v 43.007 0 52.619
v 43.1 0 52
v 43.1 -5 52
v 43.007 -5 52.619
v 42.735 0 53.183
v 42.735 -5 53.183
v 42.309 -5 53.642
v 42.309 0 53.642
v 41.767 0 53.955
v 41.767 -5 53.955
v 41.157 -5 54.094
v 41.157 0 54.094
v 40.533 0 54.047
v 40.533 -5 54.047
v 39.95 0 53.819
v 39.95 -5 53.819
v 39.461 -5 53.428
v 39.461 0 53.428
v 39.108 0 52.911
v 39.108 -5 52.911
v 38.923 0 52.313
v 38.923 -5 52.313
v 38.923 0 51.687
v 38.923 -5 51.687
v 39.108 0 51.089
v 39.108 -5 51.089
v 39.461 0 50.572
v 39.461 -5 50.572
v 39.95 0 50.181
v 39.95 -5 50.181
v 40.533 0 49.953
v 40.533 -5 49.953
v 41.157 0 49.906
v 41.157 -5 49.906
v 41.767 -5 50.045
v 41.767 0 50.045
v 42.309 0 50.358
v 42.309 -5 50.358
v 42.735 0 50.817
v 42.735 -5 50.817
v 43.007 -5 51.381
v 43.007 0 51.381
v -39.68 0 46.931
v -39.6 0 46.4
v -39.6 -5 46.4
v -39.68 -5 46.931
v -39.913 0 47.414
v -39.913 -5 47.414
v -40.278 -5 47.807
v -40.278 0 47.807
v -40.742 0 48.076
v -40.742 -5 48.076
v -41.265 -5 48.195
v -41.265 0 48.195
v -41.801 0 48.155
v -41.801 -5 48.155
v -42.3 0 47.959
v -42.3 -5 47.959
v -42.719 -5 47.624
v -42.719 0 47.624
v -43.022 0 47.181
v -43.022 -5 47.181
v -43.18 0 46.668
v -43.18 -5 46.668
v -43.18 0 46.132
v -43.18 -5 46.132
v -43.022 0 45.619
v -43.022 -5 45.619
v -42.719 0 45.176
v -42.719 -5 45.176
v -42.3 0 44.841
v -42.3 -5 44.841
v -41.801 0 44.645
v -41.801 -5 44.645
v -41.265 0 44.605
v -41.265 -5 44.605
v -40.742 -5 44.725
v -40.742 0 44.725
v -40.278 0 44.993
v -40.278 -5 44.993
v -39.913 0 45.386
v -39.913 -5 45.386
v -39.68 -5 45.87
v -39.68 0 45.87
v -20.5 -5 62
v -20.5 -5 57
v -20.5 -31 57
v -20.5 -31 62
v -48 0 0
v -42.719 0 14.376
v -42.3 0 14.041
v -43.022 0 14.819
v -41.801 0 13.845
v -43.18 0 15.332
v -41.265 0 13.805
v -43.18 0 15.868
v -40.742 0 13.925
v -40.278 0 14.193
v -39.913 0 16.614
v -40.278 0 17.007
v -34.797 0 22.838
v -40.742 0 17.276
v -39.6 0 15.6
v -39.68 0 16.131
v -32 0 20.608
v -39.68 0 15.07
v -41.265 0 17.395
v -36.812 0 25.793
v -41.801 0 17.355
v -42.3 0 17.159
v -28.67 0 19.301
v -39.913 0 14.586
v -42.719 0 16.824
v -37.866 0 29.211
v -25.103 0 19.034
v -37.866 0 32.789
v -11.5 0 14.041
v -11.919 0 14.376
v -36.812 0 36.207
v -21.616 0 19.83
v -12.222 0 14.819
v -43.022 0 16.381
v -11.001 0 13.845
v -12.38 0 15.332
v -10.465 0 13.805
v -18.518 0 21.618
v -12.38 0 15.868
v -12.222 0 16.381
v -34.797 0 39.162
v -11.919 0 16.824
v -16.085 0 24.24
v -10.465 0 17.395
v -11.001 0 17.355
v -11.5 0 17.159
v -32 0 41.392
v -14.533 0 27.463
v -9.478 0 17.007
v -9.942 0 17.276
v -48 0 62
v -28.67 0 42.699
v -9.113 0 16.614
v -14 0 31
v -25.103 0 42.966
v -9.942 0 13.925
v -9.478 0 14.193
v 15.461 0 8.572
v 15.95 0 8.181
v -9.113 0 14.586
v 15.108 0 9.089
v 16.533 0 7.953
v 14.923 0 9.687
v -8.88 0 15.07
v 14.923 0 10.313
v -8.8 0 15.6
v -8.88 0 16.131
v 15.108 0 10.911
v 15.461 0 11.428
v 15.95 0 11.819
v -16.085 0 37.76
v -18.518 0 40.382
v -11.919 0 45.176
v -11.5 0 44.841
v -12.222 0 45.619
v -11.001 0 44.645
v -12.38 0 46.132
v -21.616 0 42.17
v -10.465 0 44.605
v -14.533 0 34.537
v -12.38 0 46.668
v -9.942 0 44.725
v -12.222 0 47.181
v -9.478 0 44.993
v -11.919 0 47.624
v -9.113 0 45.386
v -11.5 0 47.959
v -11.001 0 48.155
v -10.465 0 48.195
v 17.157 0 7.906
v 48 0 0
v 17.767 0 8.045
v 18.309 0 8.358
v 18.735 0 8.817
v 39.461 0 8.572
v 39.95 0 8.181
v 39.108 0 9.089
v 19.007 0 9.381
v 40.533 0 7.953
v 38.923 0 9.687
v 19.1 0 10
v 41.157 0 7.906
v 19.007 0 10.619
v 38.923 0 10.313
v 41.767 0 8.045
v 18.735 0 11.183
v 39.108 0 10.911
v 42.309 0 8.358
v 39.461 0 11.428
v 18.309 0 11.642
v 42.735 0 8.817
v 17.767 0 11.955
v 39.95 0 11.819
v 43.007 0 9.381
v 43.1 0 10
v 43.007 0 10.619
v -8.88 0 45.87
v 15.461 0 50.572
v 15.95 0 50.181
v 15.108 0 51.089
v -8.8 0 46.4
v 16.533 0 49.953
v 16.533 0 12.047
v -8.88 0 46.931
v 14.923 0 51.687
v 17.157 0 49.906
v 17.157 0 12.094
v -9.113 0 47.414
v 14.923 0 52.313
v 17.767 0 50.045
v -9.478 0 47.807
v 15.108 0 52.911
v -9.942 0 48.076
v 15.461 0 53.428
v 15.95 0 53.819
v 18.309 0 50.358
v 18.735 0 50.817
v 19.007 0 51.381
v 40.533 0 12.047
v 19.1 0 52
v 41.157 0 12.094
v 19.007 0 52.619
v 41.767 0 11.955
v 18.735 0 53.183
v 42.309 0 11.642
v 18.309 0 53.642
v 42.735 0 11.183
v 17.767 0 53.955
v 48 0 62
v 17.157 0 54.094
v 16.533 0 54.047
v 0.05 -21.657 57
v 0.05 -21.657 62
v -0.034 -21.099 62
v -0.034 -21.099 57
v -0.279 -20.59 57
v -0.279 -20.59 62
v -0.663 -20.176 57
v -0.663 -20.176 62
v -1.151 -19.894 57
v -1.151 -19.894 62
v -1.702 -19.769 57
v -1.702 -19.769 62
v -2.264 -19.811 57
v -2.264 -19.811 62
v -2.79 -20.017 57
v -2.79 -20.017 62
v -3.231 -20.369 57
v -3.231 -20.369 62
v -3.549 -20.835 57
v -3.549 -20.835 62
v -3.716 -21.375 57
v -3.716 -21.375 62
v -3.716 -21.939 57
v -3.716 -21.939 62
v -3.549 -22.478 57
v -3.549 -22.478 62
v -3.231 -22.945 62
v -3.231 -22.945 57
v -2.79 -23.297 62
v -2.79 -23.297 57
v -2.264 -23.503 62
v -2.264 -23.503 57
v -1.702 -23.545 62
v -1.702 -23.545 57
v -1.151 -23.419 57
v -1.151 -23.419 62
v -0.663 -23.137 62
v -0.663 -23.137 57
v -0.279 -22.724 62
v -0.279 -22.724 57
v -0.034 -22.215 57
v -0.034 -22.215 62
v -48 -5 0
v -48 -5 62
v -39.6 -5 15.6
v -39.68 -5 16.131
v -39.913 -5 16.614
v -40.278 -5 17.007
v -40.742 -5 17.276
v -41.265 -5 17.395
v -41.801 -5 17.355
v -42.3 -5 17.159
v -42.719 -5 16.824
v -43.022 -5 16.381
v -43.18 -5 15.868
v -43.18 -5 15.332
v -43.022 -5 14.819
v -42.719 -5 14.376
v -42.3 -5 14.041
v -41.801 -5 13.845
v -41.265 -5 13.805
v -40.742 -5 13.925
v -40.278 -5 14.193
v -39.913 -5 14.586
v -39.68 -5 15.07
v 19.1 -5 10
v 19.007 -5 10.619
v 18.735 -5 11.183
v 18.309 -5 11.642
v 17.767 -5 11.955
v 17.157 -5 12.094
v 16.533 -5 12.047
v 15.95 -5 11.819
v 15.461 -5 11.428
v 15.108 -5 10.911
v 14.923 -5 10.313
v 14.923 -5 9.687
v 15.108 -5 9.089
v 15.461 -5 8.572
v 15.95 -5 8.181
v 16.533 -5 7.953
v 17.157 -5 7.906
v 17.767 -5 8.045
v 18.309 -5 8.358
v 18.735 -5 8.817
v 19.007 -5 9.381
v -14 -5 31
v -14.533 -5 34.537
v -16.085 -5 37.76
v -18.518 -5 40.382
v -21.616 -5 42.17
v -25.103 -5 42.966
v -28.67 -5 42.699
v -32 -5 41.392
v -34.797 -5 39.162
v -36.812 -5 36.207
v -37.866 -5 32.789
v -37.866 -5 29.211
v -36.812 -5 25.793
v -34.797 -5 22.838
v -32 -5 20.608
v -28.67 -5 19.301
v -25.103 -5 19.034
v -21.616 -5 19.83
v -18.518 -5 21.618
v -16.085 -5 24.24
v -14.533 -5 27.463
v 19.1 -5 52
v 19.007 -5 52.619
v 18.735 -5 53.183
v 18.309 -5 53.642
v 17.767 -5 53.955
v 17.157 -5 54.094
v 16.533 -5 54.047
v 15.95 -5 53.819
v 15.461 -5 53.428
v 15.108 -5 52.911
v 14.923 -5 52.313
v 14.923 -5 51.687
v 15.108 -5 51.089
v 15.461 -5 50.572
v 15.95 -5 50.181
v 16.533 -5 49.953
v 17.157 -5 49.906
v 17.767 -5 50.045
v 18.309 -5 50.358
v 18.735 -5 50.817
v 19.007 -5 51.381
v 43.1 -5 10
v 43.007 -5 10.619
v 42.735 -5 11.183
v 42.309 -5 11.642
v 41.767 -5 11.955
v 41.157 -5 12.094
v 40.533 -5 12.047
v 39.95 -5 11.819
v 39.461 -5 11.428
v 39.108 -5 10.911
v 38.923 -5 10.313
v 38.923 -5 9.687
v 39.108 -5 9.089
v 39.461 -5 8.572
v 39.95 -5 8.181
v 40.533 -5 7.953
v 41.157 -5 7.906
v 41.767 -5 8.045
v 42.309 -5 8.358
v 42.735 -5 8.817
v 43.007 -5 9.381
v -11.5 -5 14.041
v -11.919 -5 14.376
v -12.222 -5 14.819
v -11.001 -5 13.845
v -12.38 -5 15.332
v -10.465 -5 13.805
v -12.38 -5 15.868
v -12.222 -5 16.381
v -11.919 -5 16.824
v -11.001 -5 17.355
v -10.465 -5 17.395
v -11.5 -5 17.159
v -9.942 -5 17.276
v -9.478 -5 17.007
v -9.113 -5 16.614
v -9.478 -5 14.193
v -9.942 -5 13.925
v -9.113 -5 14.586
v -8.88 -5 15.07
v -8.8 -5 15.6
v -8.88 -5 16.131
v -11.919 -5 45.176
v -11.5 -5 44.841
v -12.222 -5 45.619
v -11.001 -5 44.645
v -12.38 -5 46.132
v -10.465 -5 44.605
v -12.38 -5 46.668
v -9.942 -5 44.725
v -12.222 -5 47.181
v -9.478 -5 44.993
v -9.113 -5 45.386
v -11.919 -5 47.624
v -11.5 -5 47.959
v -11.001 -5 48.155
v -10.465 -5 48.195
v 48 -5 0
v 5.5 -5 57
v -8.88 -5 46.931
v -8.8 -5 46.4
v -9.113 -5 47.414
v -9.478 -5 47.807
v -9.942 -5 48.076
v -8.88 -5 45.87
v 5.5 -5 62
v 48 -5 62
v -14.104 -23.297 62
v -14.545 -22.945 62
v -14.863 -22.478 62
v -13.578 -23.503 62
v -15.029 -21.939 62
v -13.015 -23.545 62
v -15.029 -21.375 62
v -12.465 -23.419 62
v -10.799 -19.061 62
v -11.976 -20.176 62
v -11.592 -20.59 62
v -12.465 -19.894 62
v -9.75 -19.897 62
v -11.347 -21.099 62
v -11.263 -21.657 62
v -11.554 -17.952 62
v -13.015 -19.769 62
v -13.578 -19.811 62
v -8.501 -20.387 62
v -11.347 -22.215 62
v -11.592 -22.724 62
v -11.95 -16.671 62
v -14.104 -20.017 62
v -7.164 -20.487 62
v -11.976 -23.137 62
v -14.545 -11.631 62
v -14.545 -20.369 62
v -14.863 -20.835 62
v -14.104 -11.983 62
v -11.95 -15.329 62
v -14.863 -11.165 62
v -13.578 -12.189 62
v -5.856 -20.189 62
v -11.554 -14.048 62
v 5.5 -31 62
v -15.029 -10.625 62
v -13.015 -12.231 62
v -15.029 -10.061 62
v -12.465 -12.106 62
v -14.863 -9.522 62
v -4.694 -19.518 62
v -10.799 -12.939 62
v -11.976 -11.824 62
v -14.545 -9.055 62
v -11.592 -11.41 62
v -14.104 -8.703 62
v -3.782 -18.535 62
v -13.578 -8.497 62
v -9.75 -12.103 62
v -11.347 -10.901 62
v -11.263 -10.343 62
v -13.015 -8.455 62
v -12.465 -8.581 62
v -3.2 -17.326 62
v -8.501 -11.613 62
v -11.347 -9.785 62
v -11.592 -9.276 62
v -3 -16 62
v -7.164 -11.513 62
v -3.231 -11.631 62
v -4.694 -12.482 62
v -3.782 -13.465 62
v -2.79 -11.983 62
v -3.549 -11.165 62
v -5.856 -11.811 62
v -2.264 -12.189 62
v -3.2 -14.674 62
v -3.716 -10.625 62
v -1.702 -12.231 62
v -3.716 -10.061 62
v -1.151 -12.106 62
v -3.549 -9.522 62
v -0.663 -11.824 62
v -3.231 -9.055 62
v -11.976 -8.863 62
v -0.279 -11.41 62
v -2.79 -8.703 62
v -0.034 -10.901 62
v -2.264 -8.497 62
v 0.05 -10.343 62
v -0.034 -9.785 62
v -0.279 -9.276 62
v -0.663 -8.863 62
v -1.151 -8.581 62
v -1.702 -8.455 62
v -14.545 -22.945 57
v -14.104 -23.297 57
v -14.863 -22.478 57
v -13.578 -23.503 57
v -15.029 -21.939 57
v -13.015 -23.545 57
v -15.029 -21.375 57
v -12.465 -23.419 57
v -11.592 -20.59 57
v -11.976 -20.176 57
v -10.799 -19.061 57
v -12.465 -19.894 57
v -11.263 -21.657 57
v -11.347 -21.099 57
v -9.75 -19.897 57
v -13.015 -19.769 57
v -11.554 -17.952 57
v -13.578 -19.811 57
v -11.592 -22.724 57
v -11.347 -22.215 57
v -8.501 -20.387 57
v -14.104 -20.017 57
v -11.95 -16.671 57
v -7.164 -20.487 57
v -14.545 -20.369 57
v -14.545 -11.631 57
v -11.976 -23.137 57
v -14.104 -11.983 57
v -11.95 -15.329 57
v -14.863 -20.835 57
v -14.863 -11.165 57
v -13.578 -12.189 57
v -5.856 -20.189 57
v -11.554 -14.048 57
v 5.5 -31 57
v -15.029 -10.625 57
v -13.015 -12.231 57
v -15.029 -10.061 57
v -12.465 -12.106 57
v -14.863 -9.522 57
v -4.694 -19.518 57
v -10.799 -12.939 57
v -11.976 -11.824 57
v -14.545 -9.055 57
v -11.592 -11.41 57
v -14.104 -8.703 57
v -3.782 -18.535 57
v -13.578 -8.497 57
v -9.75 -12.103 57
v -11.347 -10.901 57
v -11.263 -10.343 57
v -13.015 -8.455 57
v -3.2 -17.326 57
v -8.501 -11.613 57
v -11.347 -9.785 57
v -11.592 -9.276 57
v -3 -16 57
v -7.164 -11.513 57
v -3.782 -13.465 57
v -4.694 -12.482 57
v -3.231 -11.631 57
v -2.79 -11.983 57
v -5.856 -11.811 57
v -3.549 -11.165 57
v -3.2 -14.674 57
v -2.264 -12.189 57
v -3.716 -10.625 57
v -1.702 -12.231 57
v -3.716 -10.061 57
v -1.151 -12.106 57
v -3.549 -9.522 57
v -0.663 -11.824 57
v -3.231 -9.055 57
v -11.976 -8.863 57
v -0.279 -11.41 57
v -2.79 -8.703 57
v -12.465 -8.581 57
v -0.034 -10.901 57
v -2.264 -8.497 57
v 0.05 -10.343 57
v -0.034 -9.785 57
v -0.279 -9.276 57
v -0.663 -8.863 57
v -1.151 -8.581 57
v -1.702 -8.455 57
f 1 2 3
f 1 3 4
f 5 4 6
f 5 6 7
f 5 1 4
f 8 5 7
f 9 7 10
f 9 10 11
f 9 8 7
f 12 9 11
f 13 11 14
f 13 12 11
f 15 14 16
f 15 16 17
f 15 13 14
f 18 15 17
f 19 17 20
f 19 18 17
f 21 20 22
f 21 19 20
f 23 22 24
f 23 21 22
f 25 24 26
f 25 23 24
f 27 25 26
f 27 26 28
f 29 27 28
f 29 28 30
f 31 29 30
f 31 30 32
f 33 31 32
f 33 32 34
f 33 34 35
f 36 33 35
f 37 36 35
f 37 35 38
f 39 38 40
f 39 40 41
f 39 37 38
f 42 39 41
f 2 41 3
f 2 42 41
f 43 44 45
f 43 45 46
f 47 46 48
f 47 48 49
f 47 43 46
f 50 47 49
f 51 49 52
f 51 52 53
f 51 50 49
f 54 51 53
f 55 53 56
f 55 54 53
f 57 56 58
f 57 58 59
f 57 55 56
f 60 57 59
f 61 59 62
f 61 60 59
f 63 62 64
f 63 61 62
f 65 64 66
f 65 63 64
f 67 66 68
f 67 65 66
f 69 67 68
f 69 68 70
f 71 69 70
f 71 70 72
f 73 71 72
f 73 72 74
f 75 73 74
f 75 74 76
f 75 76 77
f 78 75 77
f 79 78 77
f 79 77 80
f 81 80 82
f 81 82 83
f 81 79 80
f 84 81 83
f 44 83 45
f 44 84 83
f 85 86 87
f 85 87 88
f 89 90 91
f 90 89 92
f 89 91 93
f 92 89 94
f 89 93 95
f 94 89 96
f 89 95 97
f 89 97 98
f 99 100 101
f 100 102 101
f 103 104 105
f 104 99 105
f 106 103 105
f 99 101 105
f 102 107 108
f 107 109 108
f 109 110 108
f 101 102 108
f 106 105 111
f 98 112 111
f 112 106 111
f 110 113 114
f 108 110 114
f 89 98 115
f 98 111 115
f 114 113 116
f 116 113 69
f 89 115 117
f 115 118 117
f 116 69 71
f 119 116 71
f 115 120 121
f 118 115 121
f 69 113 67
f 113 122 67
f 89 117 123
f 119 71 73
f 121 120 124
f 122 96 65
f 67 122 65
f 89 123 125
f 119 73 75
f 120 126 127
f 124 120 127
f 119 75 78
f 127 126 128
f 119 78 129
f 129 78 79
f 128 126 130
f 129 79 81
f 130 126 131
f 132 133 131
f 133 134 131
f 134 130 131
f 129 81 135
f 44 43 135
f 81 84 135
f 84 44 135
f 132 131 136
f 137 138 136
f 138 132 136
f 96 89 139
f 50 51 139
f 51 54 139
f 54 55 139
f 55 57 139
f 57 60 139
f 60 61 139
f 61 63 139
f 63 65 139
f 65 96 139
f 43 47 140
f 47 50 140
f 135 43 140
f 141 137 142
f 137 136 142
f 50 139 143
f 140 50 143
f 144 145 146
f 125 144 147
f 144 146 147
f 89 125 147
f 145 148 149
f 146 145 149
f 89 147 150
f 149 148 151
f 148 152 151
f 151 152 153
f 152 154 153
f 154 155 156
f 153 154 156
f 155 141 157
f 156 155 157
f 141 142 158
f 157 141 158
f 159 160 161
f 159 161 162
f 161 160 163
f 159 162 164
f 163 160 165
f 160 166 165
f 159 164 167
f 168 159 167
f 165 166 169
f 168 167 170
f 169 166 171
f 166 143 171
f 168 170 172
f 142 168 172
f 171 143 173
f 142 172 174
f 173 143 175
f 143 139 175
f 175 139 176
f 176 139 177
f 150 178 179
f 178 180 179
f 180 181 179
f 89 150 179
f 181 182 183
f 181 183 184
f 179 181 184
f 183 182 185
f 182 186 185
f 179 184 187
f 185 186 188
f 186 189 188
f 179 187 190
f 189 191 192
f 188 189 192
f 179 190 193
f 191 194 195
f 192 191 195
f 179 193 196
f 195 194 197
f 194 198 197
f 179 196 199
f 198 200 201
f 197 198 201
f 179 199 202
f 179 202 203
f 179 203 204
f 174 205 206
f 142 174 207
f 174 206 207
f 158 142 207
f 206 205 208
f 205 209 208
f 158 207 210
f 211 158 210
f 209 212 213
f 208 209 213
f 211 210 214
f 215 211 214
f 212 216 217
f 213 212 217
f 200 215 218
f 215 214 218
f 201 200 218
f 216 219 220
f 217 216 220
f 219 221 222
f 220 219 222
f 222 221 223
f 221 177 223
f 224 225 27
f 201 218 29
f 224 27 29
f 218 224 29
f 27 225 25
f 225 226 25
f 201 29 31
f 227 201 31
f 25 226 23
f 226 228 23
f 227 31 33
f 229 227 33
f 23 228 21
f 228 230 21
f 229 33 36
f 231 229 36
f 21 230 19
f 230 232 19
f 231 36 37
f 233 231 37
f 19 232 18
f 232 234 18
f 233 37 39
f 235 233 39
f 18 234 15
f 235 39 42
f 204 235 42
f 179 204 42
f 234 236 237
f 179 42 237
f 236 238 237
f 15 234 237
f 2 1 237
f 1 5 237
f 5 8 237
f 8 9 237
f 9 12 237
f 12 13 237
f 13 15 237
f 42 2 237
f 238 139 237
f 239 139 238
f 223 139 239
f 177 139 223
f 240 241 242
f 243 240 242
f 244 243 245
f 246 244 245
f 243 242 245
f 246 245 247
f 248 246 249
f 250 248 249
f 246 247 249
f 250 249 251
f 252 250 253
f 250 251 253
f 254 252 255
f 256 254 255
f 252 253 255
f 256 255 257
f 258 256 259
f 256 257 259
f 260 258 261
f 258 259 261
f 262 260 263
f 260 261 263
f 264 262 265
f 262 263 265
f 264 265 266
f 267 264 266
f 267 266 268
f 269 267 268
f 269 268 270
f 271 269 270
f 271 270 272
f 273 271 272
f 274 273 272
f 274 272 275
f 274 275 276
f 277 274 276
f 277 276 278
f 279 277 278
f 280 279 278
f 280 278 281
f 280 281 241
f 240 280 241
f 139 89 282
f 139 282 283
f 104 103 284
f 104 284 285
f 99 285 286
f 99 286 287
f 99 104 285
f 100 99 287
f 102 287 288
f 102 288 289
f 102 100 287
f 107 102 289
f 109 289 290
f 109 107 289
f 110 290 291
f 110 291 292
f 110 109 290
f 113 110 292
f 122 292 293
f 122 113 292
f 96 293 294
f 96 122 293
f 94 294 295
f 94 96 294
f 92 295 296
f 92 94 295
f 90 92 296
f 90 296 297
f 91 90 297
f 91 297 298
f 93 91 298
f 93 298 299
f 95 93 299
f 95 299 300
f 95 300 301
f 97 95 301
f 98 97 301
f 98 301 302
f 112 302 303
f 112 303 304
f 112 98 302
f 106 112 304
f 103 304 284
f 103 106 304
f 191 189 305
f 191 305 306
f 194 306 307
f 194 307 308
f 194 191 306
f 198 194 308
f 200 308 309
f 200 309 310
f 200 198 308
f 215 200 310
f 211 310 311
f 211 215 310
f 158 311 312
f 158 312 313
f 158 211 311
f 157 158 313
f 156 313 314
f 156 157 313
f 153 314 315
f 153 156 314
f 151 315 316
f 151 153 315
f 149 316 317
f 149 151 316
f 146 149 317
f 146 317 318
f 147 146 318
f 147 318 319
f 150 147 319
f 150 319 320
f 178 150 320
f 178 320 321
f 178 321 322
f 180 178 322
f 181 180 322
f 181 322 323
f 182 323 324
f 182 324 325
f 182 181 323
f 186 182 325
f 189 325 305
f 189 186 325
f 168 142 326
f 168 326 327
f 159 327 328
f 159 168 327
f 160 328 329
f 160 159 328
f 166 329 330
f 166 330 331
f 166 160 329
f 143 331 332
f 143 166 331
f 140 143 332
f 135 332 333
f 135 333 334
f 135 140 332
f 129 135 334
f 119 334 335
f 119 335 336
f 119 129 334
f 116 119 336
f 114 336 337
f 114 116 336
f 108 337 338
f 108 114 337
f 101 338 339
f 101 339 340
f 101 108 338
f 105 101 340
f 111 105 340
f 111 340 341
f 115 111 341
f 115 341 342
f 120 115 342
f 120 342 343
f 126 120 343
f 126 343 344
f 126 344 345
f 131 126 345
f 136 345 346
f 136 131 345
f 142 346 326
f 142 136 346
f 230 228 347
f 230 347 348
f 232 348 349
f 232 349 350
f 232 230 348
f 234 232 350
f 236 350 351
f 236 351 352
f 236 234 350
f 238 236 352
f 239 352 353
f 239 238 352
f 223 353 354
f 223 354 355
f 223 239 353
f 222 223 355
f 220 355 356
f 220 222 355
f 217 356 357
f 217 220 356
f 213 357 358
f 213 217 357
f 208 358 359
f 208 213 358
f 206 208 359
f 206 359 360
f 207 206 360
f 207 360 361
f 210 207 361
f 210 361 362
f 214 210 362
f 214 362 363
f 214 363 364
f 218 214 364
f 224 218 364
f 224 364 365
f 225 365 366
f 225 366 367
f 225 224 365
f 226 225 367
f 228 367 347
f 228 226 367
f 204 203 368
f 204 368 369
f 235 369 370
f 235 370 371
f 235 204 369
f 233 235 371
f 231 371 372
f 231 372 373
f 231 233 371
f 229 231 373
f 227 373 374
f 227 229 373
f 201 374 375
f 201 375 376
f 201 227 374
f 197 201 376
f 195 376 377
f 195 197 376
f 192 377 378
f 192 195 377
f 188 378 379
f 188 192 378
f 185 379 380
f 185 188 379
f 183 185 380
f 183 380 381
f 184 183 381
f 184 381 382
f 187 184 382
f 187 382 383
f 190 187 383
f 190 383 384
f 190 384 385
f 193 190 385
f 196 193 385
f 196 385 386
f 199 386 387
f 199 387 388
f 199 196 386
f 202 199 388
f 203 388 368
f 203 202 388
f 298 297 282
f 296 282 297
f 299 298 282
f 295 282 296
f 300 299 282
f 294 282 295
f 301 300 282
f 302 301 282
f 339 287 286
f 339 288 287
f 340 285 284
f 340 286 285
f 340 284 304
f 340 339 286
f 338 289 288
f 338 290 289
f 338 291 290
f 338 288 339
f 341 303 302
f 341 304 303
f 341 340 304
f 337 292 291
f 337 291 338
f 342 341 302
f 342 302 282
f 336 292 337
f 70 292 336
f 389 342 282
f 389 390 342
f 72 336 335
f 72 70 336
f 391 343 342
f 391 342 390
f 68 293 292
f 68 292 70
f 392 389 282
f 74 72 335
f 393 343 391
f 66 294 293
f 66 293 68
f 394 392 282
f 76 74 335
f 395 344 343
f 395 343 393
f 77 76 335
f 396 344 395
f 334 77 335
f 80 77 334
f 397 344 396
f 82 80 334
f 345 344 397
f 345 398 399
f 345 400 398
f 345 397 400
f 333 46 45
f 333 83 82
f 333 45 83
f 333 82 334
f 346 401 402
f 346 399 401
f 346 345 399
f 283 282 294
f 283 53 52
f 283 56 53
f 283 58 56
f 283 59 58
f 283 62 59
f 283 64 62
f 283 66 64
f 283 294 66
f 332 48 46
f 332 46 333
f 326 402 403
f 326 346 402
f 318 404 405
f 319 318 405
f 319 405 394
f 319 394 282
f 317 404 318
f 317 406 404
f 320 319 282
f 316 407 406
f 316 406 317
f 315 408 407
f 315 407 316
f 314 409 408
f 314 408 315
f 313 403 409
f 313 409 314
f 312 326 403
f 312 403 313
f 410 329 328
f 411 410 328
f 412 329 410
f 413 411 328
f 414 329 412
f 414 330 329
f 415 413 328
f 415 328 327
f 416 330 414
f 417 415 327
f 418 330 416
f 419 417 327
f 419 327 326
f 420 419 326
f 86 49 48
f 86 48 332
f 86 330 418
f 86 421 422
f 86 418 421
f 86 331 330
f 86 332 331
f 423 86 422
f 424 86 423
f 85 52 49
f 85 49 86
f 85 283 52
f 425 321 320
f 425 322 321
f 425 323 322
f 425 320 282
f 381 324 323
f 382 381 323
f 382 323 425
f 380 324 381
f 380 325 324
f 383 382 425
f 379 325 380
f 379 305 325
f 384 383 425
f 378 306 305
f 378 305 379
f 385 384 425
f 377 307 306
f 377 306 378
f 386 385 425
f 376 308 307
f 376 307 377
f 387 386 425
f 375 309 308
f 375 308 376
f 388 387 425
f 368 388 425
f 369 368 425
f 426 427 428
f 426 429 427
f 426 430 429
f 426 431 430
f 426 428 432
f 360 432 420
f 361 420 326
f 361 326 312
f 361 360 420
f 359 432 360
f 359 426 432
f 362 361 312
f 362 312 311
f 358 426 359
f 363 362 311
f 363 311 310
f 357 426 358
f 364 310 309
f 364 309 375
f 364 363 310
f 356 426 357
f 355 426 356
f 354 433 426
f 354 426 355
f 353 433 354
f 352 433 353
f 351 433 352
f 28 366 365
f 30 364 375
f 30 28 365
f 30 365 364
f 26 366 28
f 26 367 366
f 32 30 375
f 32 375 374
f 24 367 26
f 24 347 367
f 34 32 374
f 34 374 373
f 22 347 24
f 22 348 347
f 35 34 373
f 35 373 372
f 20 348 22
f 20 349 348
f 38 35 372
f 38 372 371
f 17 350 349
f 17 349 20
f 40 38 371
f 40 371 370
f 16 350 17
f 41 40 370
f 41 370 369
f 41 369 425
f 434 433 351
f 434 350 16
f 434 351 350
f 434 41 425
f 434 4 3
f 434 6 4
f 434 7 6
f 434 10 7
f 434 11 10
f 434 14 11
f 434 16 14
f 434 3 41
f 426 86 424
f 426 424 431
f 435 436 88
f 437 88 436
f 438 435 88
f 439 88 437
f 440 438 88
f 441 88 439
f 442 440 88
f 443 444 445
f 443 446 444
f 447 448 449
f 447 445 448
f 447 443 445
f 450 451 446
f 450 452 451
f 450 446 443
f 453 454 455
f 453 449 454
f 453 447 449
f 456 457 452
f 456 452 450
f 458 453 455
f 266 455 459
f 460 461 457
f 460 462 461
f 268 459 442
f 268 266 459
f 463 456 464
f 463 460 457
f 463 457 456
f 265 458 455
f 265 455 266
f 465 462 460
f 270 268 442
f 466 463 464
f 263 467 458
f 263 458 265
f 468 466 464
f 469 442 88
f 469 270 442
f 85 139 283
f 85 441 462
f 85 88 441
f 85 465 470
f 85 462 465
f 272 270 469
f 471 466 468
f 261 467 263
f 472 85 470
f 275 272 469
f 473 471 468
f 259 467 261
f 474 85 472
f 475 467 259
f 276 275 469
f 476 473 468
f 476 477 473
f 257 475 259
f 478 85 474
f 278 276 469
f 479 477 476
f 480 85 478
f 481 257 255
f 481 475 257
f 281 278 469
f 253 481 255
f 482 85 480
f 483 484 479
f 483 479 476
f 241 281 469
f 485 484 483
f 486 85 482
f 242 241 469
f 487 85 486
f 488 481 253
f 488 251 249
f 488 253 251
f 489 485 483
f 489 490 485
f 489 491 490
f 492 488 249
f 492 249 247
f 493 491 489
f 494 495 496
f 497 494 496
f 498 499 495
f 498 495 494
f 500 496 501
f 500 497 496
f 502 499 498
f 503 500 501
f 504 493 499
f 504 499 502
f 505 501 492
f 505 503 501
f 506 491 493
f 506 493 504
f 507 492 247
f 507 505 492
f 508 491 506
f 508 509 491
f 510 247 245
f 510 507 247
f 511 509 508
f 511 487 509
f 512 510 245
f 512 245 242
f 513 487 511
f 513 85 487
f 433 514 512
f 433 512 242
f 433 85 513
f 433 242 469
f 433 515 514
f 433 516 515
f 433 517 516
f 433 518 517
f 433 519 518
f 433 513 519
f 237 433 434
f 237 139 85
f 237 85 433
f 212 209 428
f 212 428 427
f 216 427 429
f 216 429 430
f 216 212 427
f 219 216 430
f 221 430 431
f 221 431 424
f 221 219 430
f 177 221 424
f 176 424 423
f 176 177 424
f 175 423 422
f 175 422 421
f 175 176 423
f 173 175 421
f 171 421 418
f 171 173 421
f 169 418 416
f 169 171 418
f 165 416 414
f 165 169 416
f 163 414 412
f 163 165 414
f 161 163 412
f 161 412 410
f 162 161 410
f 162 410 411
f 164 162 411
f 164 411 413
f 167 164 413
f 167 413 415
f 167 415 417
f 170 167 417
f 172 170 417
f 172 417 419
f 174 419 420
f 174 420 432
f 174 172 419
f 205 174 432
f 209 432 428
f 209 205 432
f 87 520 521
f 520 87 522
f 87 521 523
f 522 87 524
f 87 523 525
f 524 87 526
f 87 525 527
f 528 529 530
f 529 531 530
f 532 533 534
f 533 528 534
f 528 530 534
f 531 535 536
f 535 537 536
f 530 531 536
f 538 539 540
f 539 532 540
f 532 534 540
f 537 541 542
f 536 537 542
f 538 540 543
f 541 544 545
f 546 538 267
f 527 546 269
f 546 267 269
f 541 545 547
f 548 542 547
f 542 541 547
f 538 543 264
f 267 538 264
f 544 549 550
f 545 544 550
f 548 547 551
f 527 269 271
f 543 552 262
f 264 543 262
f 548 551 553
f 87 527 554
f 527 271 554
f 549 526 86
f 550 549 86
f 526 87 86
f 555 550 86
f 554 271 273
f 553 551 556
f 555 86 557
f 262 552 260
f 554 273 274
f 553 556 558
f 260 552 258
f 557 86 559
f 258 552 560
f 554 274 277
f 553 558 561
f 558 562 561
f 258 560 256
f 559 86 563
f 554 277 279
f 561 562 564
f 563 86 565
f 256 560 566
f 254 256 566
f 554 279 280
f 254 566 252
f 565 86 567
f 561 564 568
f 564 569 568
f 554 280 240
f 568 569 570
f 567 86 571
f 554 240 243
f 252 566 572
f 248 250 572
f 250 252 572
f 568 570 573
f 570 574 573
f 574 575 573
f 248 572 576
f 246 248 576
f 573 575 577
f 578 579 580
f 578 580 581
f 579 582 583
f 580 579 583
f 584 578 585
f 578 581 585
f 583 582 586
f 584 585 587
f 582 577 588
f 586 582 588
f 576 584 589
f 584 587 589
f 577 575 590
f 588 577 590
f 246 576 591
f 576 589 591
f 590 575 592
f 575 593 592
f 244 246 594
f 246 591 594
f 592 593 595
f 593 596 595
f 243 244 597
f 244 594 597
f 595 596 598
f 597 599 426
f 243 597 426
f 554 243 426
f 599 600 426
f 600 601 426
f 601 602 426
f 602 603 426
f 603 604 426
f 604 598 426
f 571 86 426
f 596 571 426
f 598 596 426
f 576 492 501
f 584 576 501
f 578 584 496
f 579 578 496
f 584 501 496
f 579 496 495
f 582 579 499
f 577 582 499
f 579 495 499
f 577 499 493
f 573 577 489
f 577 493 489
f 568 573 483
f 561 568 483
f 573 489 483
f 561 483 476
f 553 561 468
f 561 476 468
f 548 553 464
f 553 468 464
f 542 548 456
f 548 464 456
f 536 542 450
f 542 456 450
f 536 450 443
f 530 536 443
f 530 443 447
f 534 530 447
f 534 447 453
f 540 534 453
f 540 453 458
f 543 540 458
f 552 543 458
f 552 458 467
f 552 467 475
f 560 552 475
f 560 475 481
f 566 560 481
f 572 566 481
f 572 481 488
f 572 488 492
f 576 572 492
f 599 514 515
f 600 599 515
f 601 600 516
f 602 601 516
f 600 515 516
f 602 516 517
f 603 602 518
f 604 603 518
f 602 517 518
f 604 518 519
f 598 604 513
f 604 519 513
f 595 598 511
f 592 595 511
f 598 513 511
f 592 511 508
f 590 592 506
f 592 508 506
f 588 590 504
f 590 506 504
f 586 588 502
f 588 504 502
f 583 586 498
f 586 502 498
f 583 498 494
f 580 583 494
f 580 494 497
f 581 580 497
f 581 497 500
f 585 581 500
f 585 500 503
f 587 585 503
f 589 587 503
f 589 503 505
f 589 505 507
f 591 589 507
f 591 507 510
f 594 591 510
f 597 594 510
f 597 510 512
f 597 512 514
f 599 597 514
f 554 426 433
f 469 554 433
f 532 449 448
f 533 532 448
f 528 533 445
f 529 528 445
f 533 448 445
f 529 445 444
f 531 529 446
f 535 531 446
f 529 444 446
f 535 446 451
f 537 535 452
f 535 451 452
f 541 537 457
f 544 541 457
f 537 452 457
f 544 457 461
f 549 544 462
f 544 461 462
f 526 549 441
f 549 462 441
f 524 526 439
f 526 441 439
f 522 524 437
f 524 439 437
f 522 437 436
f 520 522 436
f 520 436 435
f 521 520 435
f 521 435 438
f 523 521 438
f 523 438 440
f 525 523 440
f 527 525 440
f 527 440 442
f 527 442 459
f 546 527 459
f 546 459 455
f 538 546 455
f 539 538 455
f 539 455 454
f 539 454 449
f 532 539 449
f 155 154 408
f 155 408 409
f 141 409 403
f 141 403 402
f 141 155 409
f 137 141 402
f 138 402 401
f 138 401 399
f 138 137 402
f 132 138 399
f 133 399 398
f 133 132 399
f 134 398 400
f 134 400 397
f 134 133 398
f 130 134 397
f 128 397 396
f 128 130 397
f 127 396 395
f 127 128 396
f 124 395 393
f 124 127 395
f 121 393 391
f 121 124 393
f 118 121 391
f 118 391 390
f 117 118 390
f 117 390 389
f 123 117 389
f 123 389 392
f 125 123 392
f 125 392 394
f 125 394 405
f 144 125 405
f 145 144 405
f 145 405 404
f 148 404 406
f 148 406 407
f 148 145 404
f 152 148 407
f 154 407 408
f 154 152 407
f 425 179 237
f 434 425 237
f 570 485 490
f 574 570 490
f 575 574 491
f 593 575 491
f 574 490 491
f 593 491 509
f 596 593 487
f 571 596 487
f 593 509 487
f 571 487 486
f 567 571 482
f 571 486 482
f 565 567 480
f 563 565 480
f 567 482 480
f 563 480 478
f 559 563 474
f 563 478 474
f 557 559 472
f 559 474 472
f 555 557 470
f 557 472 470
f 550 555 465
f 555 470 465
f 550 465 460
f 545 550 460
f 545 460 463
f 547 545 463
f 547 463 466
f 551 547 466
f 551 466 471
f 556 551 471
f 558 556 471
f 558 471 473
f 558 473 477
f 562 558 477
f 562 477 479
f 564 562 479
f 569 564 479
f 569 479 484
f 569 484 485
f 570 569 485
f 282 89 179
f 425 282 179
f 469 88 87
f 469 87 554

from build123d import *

# Parameters (mm, degrees)
F0_W     = 96
F0_H     = 62
F0_R     = 1.8
F0_R_2   = 2.1
F0_R_3   = 12
F1_DEPTH = 5
F2_W     = 26
F2_H     = 5
F3_DEPTH = 26
F4_R     = 4.5
F4_R_2   = 1.8935291465
F5_DEPTH = 25


# Not quite as in the source:
# - a feature names something its author has since deleted; it is built from what else it names


with BuildPart() as f1:
    # F0 (on Front) → F1 (new body)
    with BuildSketch(Plane.XZ):
        with Locations((0, 31)):
            Rectangle(F0_W, F0_H)
        with Locations((-41.4, 15.6001571745)):
            Circle(F0_R, mode=Mode.SUBTRACT)
        with Locations((-10.6, 15.6001571745)):
            Circle(F0_R, mode=Mode.SUBTRACT)
        with Locations((17, 10)):
            Circle(F0_R_2, mode=Mode.SUBTRACT)
        with Locations((41, 10)):
            Circle(F0_R_2, mode=Mode.SUBTRACT)
        with Locations((-26, 31)):
            Circle(F0_R_3, mode=Mode.SUBTRACT)
        with Locations((-41.4, 46.4001571745)):
            Circle(F0_R, mode=Mode.SUBTRACT)
        with Locations((-10.6, 46.4001571745)):
            Circle(F0_R, mode=Mode.SUBTRACT)
        with Locations((17, 52)):
            Circle(F0_R_2, mode=Mode.SUBTRACT)
        with Locations((41, 52)):
            Circle(F0_R_2, mode=Mode.SUBTRACT)
    extrude(amount=F1_DEPTH)

    # F2 (on face) → F3 (join)
    with BuildSketch(Plane.XZ.offset(5)):
        with Locations((-7.5, 59.5)):
            Rectangle(F2_W, F2_H)
    extrude(amount=F3_DEPTH)

    # F4 (on face) → F5 (cut)
    with BuildSketch(Plane.XY.offset(62)):
        with Locations((-7.5, -16)):
            Circle(F4_R)
        with Locations((-13.1568542495, -10.3431457505)):
            Circle(F4_R_2)
        with Locations((-1.8431457505, -10.3431457505)):
            Circle(F4_R_2)
        with Locations((-1.8431457505, -21.6568542495)):
            Circle(F4_R_2)
        with Locations((-13.1568542495, -21.6568542495)):
            Circle(F4_R_2)
    extrude(amount=-F5_DEPTH, mode=Mode.SUBTRACT)


solid = f1.part
